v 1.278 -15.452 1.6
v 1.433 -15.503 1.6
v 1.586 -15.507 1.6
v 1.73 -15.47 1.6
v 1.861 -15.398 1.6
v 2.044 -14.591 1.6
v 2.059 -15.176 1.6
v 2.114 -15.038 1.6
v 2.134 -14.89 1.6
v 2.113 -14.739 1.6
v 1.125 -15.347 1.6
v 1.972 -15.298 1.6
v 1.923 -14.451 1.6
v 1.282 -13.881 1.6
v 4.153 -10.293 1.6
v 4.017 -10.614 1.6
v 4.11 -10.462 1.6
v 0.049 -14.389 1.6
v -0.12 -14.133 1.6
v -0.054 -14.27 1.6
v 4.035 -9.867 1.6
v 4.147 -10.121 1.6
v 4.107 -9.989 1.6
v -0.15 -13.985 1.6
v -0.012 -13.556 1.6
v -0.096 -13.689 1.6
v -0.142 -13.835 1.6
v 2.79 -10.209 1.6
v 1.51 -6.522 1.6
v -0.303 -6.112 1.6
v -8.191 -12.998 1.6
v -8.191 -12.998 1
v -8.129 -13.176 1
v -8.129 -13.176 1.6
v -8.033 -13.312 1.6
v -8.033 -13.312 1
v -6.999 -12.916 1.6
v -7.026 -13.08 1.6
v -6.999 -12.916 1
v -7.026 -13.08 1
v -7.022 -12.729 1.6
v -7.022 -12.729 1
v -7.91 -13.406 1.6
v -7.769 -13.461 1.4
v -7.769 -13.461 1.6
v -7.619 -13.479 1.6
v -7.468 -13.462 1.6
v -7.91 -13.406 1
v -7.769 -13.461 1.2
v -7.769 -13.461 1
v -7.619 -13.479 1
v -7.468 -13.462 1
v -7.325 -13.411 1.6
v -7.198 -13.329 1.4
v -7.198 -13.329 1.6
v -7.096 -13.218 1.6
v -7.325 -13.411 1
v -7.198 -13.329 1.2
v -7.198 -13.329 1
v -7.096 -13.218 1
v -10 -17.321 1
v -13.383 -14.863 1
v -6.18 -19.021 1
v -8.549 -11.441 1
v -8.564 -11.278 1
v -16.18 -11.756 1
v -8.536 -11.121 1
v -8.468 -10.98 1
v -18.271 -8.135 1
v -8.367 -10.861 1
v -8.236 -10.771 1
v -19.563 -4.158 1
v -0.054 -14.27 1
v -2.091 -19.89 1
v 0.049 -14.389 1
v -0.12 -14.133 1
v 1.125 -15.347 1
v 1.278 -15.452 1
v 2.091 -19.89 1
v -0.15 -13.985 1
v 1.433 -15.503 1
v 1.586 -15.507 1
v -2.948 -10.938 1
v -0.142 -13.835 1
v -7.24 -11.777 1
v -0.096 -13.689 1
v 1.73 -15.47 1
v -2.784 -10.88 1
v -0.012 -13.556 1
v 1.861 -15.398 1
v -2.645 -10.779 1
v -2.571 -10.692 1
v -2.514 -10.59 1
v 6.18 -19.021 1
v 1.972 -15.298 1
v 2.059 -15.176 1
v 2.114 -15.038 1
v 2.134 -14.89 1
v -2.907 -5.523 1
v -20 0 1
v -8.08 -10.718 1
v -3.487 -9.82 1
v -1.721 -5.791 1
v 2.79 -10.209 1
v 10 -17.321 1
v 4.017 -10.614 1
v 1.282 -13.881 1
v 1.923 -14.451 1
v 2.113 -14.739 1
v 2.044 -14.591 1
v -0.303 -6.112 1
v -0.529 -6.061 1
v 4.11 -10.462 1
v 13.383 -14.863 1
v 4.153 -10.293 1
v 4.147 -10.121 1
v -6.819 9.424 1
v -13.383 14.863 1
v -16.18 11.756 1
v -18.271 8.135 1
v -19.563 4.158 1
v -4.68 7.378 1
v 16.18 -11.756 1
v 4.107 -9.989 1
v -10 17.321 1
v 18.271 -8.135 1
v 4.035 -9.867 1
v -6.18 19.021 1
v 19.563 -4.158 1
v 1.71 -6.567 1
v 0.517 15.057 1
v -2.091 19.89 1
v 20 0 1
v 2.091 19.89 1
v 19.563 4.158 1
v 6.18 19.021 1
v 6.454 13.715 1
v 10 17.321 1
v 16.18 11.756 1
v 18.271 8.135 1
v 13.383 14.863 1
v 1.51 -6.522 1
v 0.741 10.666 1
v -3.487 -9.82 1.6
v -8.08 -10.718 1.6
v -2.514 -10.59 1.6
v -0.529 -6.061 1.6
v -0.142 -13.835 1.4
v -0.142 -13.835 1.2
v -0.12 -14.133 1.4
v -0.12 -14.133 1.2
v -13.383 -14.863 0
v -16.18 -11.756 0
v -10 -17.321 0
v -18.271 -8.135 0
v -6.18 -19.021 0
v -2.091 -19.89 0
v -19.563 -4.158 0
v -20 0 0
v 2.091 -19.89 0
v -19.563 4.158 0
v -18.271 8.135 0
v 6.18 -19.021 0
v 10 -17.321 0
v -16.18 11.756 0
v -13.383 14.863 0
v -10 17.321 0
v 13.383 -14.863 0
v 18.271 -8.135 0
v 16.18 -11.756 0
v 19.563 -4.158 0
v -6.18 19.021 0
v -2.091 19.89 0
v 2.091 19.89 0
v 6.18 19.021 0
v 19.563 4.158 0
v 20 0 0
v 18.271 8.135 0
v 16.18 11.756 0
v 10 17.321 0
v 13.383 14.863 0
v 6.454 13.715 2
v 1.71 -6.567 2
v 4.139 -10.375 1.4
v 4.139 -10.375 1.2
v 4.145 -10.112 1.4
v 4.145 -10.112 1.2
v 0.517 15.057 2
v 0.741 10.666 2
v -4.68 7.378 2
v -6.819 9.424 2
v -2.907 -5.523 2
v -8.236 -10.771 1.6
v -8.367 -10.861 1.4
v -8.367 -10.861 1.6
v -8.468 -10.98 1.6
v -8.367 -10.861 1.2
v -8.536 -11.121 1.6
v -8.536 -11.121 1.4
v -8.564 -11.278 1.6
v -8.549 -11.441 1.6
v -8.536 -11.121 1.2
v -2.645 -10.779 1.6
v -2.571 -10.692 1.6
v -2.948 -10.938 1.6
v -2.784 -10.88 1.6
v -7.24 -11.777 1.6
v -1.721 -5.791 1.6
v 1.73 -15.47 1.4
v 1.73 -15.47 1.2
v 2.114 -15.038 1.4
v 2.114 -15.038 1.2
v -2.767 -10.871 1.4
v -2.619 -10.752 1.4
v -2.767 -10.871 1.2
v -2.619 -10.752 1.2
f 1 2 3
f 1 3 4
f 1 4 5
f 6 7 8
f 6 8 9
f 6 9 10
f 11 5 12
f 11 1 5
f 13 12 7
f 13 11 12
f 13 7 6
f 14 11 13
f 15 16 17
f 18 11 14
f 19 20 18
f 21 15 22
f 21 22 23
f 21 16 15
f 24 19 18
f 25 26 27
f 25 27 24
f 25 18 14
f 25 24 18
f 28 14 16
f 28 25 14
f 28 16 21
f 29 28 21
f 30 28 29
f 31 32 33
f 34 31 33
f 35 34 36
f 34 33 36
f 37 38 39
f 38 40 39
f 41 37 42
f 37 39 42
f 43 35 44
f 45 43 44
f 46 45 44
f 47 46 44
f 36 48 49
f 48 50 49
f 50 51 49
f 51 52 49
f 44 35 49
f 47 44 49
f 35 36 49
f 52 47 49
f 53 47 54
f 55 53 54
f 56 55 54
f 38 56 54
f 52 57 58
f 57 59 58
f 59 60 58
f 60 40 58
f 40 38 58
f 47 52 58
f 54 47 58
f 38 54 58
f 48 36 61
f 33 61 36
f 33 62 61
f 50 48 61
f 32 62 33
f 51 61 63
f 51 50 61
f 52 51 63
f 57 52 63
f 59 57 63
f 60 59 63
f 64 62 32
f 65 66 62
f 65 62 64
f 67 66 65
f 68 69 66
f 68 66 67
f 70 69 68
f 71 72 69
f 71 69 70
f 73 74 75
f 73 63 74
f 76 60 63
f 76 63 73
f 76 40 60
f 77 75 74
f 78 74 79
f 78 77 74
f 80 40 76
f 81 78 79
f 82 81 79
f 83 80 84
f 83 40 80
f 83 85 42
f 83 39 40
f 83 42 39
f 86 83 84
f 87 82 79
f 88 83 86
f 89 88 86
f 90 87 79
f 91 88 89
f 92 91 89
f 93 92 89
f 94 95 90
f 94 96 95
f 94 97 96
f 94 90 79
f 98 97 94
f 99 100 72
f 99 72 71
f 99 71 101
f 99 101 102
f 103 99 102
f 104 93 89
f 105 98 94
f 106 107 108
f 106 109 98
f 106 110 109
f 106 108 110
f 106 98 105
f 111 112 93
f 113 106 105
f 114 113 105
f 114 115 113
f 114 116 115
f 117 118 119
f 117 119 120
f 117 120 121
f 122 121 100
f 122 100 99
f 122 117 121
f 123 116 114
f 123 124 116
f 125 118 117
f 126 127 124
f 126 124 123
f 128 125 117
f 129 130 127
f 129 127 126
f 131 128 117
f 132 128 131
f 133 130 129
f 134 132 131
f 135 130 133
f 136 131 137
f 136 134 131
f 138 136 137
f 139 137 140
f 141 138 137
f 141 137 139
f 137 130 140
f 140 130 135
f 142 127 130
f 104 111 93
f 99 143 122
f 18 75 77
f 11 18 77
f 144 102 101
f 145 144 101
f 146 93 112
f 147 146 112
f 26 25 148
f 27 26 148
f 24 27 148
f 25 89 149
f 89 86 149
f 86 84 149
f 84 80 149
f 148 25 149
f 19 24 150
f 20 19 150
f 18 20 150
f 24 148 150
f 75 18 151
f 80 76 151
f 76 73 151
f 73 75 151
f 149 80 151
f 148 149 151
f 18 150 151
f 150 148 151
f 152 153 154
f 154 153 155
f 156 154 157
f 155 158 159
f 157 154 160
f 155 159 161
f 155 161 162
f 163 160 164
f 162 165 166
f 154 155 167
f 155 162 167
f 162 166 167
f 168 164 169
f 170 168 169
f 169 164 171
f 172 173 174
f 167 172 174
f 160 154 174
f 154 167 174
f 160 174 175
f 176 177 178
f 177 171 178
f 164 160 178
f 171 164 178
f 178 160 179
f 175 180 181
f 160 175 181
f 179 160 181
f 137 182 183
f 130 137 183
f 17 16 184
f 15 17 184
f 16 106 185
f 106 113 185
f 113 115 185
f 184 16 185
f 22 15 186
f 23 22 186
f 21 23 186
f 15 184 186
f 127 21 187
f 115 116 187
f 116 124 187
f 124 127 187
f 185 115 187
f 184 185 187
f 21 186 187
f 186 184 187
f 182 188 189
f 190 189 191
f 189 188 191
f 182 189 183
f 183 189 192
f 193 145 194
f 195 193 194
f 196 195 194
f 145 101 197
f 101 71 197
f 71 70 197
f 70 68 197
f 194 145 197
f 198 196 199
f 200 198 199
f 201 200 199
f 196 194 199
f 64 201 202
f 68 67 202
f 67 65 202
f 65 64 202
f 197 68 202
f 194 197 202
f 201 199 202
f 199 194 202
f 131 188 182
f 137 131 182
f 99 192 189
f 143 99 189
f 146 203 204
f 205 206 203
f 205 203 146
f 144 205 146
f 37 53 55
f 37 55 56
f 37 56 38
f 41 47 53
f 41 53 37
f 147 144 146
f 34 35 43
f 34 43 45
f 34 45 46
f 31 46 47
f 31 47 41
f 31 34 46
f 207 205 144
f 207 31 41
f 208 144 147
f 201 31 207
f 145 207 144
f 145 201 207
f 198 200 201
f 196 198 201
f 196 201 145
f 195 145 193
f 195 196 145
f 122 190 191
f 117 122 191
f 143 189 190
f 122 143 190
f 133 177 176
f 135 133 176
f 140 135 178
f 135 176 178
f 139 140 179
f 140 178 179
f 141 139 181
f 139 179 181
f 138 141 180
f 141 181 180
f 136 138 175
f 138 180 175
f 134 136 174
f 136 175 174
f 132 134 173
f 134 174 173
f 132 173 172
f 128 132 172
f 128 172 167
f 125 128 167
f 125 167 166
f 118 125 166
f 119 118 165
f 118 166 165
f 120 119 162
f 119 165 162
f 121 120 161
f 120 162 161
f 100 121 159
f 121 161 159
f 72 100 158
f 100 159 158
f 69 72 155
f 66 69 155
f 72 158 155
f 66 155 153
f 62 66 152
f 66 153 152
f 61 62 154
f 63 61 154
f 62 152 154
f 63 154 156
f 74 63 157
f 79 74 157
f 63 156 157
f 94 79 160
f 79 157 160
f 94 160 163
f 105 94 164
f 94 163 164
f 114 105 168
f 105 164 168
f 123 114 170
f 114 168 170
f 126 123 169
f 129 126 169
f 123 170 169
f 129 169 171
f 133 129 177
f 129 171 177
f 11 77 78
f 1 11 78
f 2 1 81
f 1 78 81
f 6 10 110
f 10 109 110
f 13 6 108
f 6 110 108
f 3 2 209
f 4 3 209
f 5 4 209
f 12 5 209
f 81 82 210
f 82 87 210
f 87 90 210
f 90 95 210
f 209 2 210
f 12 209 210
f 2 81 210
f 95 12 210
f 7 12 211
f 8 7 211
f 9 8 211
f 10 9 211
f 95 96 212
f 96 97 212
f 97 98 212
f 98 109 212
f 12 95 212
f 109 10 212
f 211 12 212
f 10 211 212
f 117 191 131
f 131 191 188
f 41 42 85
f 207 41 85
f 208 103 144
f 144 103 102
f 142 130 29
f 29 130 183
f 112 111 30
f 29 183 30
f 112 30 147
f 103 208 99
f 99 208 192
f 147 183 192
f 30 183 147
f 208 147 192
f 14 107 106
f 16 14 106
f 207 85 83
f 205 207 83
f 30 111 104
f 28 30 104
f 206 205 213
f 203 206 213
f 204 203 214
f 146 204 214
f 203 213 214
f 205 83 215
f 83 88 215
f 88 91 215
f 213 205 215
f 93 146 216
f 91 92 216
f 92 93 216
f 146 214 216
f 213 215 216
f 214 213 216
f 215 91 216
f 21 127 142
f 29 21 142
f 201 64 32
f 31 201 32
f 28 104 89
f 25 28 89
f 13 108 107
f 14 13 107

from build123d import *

# Parameters (mm, degrees)
EXTRUDE001_DEPTH = 1
EXTRUDE_DEPTH    = 0.6
CYLINDER_R       = 20
CYLINDER_DEPTH   = 1


with BuildPart() as body:
    # path4_7_6_1_6 → Extrude001 (new body)
    with BuildSketch(Plane(origin=(-0.182391, 4.245198, 1), x_dir=(0, -1, 0), z_dir=(0, 0, -1))):
        with BuildLine():
            add(Edge.make_bspline(
                [(-5.179264, 6.636207), (-10.812113, -0.699558)],
                knots=[0, 0, 32.771748, 32.771748], degree=1))
            add(Edge.make_bspline(
                [(-10.812113, -0.699558), (-9.469887, -6.636207)],
                knots=[0, 0, 21.566306, 21.566306], degree=1))
            add(Edge.make_bspline(
                [(-9.469887, -6.636207), (10.812113, -1.892574)],
                knots=[0, 0, 73.804763, 73.804763], degree=1))
            add(Edge.make_bspline(
                [(10.812113, -1.892574), (9.768057, 2.72503)],
                knots=[0, 0, 16.774602, 16.774602], degree=1))
            add(Edge.make_bspline(
                [(9.768057, 2.72503), (-6.421163, -0.923188)],
                knots=[0, 0, 58.801858, 58.801858], degree=1))
            add(Edge.make_bspline(
                [(-6.421163, -0.923188), (-3.132877, 4.49797)],
                knots=[0, 0, 22.466297, 22.466297], degree=1))
            add(Edge.make_bspline(
                [(-3.132877, 4.49797), (-5.179264, 6.636207)],
                knots=[0, 0, 10.487087, 10.487087], degree=1))
        make_face()
    extrude(amount=EXTRUDE001_DEPTH)


with BuildPart() as body_1:
    # Extrude001 placement: moved
    add(body.part.moved(Location((0, 0, 1))))


with BuildPart() as fusion:
    # path6_7_2_1_0_9 → Extrude (new body)
    with BuildSketch(Plane(origin=(-2.209018, -10.301053, 1), x_dir=(0, 1, 0), z_dir=(0, 0, 1))):
        with BuildLine():
            add(Edge.make_bspline(
                [(5.102704, -0.748152), (0.480762, 1.277563)],
                knots=[0, 0, 17.880845, 17.880845], degree=1))
            add(Edge.make_bspline(
                [(0.480762, 1.277563), (-0.416615, 5.870839)],
                knots=[0, 0, 16.583084, 16.583084], degree=1))
            add(Edge.make_bspline(
                [(-0.416615, 5.870839), (-0.481689, 6.203856), (-0.809722, 6.416714), (-1.140362, 6.340474)],
                knots=[0, 0, 0, 0, 1, 1, 1, 1], degree=3))
            add(Edge.make_bspline(
                [(-1.140362, 6.340474), (-2.696993, 5.981634)],
                knots=[0, 0, 5.660276, 5.660276], degree=1))
            add(Edge.make_bspline(
                [(-2.696993, 5.981634), (-3.498944, 5.81621), (-3.220876, 4.610113), (-2.427448, 4.812506)],
                knots=[0, 0, 0, 0, 1, 1, 1, 1], degree=3))
            add(Edge.make_bspline(
                [(-2.427448, 4.812506), (-1.475501, 5.031338)],
                knots=[0, 0, 3.461016, 3.461016], degree=1))
            add(Edge.make_bspline(
                [(-1.475501, 5.031338), (-0.63655, 0.739027)],
                knots=[0, 0, 15.496767, 15.496767], degree=1))
            add(Edge.make_bspline(
                [(-0.63655, 0.739027), (-0.598809, 0.545987), (-0.468854, 0.383697), (-0.288734, 0.30467)],
                knots=[0, 0, 0, 0, 1, 1, 1, 1], degree=3))
            add(Edge.make_bspline(
                [(-0.288734, 0.30467), (4.397148, -1.74916)],
                knots=[0, 0, 18.12834, 18.12834], degree=1))
            add(Edge.make_bspline(
                [(4.397148, -1.74916), (0.091606, -4.999124)],
                knots=[0, 0, 19.114151, 19.114151], degree=1))
            add(Edge.make_bspline(
                [(0.091606, -4.999124), (-3.255375, -2.197298)],
                knots=[0, 0, 15.466244, 15.466244], degree=1))
            add(Edge.make_bspline(
                [(-3.255375, -2.197298), (-3.503985, -1.989464), (-3.872691, -2.016549), (-4.088261, -2.258481)],
                knots=[0, 0, 0, 0, 1, 1, 1, 1], degree=3))
            add(Edge.make_bspline(
                [(-4.088261, -2.258481), (-5.046273, -3.333903)],
                knots=[0, 0, 5.103247, 5.103247], degree=1))
            add(Edge.make_bspline(
                [(-5.046273, -3.333903), (-5.57838, -3.931421), (-4.682104, -4.729582), (-4.149997, -4.132064)],
                knots=[0, 0, 0, 0, 1, 1, 1, 1], degree=3))
            add(Edge.make_bspline(
                [(-4.149997, -4.132064), (-3.57949, -3.490999)],
                knots=[0, 0, 3.040732, 3.040732], degree=1))
            add(Edge.make_bspline(
                [(-3.57949, -3.490999), (-0.312988, -6.22558)],
                knots=[0, 0, 15.094642, 15.094642], degree=1))
            add(Edge.make_bspline(
                [(-0.312988, -6.22558), (-0.098751, -6.404963), (0.210946, -6.412733), (0.43391, -6.244319)],
                knots=[0, 0, 0, 0, 1, 1, 1, 1], degree=3))
            add(Edge.make_bspline(
                [(0.43391, -6.244319), (5.343033, -2.538499)],
                knots=[0, 0, 21.794246, 21.794246], degree=1))
            add(Edge.make_bspline(
                [(5.343033, -2.538499), (5.102704, -0.748152)],
                knots=[0, 0, 6.40065, 6.40065], degree=1))
        make_face()
    extrude(amount=EXTRUDE_DEPTH)

    # Fusion: union Body
    add(body_1.part)


with BuildPart() as bit_1_coin:
    # Cylinder → Cylinder (new body)
    with BuildSketch(Plane.XY):
        Circle(CYLINDER_R)
    extrude(amount=CYLINDER_DEPTH)

    # Fusion001: union Fusion
    add(fusion.part)


solid = bit_1_coin.part
